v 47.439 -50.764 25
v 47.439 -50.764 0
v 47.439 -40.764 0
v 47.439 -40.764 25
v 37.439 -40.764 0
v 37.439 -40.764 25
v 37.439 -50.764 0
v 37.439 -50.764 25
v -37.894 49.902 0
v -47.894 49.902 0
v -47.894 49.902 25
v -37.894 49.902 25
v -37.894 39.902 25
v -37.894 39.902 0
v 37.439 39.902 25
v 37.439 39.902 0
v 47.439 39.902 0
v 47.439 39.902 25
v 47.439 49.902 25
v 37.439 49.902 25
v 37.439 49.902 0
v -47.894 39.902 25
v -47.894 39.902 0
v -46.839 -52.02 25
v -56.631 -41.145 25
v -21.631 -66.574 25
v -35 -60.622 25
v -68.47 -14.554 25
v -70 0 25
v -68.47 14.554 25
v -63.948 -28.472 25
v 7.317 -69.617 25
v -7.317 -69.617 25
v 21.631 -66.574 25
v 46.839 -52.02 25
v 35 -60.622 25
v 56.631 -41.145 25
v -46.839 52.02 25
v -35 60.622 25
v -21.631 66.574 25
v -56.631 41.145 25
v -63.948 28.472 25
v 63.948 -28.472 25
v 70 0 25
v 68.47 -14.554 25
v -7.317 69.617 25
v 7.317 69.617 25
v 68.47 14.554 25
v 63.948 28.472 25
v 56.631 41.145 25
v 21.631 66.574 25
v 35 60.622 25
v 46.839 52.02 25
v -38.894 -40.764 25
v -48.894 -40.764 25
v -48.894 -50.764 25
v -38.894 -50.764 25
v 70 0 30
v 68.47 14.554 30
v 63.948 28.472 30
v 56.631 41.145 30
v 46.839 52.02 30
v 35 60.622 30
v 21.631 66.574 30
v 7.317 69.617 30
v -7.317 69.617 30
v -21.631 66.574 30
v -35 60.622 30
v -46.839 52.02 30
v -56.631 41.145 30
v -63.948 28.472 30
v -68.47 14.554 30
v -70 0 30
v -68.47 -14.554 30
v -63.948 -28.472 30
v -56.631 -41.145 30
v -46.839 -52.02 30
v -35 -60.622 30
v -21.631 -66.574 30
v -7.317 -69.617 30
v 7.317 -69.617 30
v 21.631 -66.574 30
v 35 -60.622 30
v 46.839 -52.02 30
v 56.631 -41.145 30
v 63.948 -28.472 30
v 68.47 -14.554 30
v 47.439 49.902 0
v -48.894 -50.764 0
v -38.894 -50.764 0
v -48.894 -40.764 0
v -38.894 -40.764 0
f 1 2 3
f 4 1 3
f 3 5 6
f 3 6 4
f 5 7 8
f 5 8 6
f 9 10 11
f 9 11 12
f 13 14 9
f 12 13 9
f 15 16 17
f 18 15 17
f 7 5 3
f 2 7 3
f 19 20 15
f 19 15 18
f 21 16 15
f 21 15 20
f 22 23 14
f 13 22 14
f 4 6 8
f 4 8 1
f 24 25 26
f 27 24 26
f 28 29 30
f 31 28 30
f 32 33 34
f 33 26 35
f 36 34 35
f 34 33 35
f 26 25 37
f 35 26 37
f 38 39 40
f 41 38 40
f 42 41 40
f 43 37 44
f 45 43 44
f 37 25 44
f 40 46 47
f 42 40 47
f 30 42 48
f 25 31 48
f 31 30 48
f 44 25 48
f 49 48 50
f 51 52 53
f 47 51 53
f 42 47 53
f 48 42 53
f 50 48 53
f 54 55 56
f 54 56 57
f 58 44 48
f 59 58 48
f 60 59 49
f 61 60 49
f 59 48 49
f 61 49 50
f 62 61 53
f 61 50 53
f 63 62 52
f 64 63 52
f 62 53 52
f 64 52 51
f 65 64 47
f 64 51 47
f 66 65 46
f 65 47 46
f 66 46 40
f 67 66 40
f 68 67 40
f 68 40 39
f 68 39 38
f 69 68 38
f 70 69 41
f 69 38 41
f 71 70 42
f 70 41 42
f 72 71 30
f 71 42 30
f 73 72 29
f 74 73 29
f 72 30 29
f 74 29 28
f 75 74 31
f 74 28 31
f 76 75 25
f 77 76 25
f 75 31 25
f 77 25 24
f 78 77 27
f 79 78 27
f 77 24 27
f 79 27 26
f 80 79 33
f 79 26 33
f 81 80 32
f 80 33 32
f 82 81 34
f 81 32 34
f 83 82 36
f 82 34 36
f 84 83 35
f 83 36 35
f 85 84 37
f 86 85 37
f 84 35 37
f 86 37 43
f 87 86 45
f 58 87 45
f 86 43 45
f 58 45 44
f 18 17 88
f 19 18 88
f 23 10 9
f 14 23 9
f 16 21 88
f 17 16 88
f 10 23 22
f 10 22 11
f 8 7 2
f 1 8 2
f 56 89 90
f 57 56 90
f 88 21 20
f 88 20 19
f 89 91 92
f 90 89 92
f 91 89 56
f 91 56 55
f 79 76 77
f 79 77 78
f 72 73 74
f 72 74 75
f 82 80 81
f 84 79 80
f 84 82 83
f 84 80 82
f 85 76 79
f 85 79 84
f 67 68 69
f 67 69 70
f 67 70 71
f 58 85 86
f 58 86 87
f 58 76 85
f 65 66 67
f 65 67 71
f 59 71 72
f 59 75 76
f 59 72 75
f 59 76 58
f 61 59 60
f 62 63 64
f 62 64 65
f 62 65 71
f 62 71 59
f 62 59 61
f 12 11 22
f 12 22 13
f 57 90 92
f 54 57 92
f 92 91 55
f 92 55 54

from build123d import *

# Parameters (mm, degrees)
F0_W     = 10
F0_H     = 10
F1_DEPTH = 25
F2_R     = 70
F3_DEPTH = 5


with BuildPart() as f1:
    # F0 (on Top) → F1 (new body)
    with BuildSketch(Plane.XY):
        with Locations((-42.893992, 44.902285)):
            Rectangle(F0_W, F0_H)
        with Locations((42.43937, 44.902285)):
            Rectangle(F0_W, F0_H)
        with Locations((42.43937, -45.76441)):
            Rectangle(F0_W, F0_H)
        with Locations((-43.893993, -45.76441)):
            Rectangle(F0_W, F0_H)
    extrude(amount=F1_DEPTH)


with BuildPart() as f3:
    # F2 (on face) → F3 (new body)
    with BuildSketch(Plane.XY.offset(25)):
        Circle(F2_R)
    extrude(amount=F3_DEPTH)


solid = Compound([f1.part, f3.part])
